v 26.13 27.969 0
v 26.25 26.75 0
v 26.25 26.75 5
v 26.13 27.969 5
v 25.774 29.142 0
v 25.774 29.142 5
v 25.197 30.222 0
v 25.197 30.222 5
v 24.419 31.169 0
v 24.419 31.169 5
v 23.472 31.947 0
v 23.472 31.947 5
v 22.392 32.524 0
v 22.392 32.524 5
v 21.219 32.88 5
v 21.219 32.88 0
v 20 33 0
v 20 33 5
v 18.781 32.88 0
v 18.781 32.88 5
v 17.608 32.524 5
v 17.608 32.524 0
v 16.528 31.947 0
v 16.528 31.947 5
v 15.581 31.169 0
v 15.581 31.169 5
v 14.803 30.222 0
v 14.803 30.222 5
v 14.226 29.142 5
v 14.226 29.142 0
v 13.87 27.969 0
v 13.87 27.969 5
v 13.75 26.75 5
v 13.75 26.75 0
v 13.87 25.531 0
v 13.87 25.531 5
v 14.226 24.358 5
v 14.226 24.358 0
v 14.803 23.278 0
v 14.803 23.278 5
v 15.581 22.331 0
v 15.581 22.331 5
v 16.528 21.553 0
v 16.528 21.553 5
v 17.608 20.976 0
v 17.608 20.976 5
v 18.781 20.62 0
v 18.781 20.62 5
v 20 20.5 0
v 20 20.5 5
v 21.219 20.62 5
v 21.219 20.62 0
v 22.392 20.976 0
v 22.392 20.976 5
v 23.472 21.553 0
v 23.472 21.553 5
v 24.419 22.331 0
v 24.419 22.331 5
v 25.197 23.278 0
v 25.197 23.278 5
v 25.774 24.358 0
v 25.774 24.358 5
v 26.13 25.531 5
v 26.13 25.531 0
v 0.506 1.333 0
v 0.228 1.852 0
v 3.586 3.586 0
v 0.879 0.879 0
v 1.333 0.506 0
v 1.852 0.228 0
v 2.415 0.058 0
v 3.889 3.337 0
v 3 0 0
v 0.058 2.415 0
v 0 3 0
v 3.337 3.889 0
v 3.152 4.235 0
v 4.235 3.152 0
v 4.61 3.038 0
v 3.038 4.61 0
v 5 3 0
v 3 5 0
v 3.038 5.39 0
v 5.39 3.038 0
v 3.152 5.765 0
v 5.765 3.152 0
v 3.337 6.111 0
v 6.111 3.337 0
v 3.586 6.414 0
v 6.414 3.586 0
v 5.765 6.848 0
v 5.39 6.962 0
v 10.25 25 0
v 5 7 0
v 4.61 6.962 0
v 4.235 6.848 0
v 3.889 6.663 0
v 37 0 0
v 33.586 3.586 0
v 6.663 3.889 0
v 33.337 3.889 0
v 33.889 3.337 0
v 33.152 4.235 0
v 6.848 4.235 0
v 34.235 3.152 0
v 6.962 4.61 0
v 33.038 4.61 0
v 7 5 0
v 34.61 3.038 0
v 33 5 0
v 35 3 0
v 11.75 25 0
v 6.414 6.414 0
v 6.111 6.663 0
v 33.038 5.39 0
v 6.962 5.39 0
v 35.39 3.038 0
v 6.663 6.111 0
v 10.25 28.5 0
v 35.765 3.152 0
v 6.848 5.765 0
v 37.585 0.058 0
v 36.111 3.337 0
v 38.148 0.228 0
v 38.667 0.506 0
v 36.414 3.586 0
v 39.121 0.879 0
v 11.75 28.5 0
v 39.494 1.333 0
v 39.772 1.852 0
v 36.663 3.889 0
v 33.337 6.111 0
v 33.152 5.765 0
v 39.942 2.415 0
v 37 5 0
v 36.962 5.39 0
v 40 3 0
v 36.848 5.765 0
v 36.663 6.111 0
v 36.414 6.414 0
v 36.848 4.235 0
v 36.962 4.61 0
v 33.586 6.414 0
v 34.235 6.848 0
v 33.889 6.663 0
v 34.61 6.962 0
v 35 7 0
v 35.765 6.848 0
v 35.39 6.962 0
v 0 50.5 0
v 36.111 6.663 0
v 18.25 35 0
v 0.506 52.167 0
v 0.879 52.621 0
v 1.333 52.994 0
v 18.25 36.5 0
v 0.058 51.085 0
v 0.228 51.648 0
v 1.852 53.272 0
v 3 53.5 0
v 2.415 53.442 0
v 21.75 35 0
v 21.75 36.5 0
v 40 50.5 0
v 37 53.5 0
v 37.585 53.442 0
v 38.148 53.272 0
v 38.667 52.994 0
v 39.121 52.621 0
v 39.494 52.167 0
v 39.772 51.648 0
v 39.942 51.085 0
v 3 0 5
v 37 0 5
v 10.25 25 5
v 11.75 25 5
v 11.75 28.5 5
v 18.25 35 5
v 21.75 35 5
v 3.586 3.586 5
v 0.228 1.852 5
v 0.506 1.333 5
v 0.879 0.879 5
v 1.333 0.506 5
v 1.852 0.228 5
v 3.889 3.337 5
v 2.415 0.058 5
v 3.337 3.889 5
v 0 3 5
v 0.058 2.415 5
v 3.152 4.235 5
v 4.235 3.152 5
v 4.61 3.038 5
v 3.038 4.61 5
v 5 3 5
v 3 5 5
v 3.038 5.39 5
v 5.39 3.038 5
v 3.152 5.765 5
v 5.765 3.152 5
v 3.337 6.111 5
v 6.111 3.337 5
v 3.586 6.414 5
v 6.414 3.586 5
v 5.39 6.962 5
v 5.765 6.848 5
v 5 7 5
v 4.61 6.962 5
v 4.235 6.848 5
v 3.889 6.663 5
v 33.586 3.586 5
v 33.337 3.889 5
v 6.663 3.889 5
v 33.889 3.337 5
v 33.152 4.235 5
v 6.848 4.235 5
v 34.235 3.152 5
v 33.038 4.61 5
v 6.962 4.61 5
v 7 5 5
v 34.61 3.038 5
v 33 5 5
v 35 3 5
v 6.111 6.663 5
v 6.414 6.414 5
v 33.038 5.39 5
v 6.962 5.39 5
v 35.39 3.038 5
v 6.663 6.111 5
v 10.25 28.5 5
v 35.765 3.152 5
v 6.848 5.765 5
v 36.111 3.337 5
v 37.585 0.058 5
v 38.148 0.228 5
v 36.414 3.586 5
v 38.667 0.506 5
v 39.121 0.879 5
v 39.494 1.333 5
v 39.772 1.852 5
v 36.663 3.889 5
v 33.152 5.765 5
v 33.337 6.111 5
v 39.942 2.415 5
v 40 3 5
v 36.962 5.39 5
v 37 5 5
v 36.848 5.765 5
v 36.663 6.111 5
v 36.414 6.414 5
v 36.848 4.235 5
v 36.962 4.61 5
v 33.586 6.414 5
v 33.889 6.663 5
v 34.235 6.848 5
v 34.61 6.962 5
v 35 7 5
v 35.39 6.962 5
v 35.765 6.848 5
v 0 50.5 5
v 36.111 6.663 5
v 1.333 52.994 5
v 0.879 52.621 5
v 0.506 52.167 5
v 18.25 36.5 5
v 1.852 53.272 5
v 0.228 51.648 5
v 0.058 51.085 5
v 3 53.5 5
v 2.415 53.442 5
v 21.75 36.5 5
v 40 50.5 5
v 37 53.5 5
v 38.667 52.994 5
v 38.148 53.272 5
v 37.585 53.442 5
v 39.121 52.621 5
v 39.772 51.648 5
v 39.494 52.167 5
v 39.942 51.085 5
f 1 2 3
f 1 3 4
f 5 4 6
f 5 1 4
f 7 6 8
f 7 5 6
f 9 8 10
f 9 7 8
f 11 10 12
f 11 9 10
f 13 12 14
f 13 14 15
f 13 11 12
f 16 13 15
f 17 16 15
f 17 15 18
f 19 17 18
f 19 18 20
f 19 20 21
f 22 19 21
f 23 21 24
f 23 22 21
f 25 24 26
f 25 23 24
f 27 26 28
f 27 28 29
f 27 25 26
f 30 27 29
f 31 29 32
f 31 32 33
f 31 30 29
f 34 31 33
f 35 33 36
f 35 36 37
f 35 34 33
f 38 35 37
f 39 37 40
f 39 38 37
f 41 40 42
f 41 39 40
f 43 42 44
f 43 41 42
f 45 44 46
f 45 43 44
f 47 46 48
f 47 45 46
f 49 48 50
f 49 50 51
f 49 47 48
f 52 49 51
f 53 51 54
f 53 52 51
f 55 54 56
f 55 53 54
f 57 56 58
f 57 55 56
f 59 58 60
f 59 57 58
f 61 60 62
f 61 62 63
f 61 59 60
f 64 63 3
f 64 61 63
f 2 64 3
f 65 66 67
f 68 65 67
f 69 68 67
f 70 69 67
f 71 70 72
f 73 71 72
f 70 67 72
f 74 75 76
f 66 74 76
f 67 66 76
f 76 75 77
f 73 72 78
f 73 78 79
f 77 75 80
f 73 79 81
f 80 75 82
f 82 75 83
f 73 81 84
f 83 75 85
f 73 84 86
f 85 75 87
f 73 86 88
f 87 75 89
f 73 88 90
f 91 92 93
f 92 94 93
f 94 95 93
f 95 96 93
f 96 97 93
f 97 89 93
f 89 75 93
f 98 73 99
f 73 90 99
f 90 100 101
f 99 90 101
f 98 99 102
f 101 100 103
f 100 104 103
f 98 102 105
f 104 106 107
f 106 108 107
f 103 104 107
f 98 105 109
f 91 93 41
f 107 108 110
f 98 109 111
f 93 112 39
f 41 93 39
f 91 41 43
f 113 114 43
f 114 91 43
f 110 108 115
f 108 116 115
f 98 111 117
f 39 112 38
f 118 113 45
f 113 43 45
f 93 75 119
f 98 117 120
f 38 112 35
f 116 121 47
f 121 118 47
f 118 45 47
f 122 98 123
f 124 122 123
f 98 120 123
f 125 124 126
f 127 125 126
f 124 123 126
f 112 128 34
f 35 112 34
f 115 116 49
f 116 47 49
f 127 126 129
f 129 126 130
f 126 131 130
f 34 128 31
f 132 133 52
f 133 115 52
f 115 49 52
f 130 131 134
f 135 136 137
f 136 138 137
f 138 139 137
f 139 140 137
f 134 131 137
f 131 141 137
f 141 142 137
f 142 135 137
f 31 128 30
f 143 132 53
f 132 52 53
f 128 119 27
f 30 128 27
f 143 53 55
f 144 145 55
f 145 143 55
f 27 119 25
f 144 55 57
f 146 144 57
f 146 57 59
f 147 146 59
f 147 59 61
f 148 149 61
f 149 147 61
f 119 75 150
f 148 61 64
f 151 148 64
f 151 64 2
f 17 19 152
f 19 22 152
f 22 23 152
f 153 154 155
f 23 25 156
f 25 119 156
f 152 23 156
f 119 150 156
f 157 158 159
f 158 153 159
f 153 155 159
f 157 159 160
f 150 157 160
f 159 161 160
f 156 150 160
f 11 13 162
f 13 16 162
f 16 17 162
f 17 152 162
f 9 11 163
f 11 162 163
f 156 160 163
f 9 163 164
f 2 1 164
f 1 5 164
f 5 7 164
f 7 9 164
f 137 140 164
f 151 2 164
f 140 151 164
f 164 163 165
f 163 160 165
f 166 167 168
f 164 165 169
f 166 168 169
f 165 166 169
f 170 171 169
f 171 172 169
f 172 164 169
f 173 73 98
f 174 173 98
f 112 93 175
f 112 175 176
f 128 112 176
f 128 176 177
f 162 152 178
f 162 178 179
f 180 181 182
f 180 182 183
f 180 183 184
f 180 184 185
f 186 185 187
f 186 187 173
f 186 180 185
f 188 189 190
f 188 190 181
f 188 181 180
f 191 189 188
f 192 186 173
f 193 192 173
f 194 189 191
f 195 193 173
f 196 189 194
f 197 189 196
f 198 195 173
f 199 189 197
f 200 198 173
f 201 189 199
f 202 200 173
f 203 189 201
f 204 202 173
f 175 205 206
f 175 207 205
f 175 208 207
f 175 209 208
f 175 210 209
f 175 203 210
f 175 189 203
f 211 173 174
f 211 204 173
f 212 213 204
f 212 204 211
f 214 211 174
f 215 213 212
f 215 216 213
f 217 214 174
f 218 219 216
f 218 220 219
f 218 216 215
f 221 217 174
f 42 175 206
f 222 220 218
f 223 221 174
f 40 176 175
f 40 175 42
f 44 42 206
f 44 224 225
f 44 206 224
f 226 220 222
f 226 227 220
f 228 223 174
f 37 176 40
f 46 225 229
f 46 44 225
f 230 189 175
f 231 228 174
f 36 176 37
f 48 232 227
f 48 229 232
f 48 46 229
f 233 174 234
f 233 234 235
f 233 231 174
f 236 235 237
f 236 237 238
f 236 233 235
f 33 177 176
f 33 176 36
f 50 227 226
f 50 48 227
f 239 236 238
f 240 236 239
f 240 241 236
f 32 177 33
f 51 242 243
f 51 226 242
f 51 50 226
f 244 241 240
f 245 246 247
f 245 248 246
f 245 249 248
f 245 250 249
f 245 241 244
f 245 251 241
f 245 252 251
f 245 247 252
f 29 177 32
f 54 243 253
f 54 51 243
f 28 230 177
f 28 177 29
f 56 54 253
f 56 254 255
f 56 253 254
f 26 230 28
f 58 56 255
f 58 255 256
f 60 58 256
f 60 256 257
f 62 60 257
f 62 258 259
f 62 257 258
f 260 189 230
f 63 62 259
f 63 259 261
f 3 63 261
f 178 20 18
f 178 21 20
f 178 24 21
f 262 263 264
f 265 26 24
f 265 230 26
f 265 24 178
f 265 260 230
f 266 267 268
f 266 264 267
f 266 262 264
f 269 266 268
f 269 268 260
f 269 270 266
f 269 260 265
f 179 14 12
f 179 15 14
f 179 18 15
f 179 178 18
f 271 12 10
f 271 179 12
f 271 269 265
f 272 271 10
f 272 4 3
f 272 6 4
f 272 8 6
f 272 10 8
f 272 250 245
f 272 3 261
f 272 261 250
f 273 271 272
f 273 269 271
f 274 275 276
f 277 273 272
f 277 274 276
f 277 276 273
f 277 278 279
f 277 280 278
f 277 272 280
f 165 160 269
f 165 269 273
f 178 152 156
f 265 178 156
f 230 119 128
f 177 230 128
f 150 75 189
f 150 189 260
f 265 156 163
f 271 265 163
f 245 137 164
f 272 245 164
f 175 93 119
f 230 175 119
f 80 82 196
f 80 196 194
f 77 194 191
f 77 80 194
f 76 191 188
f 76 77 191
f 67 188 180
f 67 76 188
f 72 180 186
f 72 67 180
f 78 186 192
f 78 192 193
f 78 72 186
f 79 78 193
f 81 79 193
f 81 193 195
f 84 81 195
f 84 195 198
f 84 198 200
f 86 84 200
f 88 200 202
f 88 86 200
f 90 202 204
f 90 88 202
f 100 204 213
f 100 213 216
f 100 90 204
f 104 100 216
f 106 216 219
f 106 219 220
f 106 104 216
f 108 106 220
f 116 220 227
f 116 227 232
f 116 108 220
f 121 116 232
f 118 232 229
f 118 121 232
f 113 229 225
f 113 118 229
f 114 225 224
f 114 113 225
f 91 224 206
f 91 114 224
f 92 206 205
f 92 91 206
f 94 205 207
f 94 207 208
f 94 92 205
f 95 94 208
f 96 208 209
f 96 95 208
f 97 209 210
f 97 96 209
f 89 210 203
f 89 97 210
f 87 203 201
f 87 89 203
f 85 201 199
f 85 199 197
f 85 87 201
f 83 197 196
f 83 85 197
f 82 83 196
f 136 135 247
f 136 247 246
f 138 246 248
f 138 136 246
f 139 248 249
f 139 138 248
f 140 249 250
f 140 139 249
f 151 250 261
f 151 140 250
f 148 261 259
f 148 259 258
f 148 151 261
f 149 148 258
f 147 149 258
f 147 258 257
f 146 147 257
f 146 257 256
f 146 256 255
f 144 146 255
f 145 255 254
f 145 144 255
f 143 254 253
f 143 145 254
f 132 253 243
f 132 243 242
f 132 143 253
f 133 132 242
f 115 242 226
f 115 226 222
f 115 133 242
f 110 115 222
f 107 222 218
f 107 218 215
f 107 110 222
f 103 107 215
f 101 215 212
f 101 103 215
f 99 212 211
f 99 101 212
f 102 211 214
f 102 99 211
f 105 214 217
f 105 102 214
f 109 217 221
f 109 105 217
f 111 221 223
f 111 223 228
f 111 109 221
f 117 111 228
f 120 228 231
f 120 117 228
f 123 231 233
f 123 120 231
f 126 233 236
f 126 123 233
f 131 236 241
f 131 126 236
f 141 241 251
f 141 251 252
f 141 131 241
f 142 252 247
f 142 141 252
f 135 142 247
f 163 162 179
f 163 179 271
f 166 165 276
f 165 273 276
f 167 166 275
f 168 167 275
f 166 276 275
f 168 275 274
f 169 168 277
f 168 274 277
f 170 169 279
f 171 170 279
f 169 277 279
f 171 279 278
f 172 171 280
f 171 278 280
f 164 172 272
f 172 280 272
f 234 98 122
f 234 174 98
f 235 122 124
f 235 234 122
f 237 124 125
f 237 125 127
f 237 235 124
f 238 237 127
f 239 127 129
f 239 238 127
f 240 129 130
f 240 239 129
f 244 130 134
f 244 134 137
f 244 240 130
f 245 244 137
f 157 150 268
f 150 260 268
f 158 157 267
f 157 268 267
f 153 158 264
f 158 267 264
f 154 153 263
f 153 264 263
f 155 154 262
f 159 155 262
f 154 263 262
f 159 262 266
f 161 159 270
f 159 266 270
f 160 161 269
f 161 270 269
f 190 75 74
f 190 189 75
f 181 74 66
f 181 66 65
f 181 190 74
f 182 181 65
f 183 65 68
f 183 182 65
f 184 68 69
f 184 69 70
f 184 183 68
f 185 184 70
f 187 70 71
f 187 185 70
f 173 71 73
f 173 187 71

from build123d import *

# Parameters (mm, degrees)
SKETCH_1_W      = 40
SKETCH_1_H      = 53.5
SKETCH_1_R      = 6.25
SKETCH_1_R_2    = 2
SKETCH_1_W_2    = 3.5
SKETCH_1_H_2    = 1.5
SKETCH_1_W_3    = 1.5
SKETCH_1_H_3    = 3.5
EXTRUDE_1_DEPTH = 5
FILLET_1_R      = 3


with BuildPart() as part:
    # ｽｹｯﾁ1 → ﾎﾞｽ - 押し出し1 (new body)
    with BuildSketch(Plane.XY):
        with Locations((20, 26.75)):
            Rectangle(SKETCH_1_W, SKETCH_1_H)
        with Locations((20, 26.75)):
            Circle(SKETCH_1_R, mode=Mode.SUBTRACT)
        with Locations((35, 5)):
            Circle(SKETCH_1_R_2, mode=Mode.SUBTRACT)
        with Locations(Location((5, 5, 0), (0, 0, 180))):
            Circle(SKETCH_1_R_2, mode=Mode.SUBTRACT)
        with Locations((20, 35.75)):
            Rectangle(SKETCH_1_W_2, SKETCH_1_H_2, mode=Mode.SUBTRACT)
        with Locations((11, 26.75)):
            Rectangle(SKETCH_1_W_3, SKETCH_1_H_3, mode=Mode.SUBTRACT)
    extrude(amount=EXTRUDE_1_DEPTH)

    # ﾌｨﾚｯﾄ1
    fillet_1_edges = [part.edges().sort_by_distance(p)[0] for p in [
        (0, 53.5, 2.5),
        (40, 53.5, 2.5),
        (40, 0, 2.5),
        (0, 0, 2.5),
    ]]
    fillet(fillet_1_edges, radius=FILLET_1_R)


solid = part.part
